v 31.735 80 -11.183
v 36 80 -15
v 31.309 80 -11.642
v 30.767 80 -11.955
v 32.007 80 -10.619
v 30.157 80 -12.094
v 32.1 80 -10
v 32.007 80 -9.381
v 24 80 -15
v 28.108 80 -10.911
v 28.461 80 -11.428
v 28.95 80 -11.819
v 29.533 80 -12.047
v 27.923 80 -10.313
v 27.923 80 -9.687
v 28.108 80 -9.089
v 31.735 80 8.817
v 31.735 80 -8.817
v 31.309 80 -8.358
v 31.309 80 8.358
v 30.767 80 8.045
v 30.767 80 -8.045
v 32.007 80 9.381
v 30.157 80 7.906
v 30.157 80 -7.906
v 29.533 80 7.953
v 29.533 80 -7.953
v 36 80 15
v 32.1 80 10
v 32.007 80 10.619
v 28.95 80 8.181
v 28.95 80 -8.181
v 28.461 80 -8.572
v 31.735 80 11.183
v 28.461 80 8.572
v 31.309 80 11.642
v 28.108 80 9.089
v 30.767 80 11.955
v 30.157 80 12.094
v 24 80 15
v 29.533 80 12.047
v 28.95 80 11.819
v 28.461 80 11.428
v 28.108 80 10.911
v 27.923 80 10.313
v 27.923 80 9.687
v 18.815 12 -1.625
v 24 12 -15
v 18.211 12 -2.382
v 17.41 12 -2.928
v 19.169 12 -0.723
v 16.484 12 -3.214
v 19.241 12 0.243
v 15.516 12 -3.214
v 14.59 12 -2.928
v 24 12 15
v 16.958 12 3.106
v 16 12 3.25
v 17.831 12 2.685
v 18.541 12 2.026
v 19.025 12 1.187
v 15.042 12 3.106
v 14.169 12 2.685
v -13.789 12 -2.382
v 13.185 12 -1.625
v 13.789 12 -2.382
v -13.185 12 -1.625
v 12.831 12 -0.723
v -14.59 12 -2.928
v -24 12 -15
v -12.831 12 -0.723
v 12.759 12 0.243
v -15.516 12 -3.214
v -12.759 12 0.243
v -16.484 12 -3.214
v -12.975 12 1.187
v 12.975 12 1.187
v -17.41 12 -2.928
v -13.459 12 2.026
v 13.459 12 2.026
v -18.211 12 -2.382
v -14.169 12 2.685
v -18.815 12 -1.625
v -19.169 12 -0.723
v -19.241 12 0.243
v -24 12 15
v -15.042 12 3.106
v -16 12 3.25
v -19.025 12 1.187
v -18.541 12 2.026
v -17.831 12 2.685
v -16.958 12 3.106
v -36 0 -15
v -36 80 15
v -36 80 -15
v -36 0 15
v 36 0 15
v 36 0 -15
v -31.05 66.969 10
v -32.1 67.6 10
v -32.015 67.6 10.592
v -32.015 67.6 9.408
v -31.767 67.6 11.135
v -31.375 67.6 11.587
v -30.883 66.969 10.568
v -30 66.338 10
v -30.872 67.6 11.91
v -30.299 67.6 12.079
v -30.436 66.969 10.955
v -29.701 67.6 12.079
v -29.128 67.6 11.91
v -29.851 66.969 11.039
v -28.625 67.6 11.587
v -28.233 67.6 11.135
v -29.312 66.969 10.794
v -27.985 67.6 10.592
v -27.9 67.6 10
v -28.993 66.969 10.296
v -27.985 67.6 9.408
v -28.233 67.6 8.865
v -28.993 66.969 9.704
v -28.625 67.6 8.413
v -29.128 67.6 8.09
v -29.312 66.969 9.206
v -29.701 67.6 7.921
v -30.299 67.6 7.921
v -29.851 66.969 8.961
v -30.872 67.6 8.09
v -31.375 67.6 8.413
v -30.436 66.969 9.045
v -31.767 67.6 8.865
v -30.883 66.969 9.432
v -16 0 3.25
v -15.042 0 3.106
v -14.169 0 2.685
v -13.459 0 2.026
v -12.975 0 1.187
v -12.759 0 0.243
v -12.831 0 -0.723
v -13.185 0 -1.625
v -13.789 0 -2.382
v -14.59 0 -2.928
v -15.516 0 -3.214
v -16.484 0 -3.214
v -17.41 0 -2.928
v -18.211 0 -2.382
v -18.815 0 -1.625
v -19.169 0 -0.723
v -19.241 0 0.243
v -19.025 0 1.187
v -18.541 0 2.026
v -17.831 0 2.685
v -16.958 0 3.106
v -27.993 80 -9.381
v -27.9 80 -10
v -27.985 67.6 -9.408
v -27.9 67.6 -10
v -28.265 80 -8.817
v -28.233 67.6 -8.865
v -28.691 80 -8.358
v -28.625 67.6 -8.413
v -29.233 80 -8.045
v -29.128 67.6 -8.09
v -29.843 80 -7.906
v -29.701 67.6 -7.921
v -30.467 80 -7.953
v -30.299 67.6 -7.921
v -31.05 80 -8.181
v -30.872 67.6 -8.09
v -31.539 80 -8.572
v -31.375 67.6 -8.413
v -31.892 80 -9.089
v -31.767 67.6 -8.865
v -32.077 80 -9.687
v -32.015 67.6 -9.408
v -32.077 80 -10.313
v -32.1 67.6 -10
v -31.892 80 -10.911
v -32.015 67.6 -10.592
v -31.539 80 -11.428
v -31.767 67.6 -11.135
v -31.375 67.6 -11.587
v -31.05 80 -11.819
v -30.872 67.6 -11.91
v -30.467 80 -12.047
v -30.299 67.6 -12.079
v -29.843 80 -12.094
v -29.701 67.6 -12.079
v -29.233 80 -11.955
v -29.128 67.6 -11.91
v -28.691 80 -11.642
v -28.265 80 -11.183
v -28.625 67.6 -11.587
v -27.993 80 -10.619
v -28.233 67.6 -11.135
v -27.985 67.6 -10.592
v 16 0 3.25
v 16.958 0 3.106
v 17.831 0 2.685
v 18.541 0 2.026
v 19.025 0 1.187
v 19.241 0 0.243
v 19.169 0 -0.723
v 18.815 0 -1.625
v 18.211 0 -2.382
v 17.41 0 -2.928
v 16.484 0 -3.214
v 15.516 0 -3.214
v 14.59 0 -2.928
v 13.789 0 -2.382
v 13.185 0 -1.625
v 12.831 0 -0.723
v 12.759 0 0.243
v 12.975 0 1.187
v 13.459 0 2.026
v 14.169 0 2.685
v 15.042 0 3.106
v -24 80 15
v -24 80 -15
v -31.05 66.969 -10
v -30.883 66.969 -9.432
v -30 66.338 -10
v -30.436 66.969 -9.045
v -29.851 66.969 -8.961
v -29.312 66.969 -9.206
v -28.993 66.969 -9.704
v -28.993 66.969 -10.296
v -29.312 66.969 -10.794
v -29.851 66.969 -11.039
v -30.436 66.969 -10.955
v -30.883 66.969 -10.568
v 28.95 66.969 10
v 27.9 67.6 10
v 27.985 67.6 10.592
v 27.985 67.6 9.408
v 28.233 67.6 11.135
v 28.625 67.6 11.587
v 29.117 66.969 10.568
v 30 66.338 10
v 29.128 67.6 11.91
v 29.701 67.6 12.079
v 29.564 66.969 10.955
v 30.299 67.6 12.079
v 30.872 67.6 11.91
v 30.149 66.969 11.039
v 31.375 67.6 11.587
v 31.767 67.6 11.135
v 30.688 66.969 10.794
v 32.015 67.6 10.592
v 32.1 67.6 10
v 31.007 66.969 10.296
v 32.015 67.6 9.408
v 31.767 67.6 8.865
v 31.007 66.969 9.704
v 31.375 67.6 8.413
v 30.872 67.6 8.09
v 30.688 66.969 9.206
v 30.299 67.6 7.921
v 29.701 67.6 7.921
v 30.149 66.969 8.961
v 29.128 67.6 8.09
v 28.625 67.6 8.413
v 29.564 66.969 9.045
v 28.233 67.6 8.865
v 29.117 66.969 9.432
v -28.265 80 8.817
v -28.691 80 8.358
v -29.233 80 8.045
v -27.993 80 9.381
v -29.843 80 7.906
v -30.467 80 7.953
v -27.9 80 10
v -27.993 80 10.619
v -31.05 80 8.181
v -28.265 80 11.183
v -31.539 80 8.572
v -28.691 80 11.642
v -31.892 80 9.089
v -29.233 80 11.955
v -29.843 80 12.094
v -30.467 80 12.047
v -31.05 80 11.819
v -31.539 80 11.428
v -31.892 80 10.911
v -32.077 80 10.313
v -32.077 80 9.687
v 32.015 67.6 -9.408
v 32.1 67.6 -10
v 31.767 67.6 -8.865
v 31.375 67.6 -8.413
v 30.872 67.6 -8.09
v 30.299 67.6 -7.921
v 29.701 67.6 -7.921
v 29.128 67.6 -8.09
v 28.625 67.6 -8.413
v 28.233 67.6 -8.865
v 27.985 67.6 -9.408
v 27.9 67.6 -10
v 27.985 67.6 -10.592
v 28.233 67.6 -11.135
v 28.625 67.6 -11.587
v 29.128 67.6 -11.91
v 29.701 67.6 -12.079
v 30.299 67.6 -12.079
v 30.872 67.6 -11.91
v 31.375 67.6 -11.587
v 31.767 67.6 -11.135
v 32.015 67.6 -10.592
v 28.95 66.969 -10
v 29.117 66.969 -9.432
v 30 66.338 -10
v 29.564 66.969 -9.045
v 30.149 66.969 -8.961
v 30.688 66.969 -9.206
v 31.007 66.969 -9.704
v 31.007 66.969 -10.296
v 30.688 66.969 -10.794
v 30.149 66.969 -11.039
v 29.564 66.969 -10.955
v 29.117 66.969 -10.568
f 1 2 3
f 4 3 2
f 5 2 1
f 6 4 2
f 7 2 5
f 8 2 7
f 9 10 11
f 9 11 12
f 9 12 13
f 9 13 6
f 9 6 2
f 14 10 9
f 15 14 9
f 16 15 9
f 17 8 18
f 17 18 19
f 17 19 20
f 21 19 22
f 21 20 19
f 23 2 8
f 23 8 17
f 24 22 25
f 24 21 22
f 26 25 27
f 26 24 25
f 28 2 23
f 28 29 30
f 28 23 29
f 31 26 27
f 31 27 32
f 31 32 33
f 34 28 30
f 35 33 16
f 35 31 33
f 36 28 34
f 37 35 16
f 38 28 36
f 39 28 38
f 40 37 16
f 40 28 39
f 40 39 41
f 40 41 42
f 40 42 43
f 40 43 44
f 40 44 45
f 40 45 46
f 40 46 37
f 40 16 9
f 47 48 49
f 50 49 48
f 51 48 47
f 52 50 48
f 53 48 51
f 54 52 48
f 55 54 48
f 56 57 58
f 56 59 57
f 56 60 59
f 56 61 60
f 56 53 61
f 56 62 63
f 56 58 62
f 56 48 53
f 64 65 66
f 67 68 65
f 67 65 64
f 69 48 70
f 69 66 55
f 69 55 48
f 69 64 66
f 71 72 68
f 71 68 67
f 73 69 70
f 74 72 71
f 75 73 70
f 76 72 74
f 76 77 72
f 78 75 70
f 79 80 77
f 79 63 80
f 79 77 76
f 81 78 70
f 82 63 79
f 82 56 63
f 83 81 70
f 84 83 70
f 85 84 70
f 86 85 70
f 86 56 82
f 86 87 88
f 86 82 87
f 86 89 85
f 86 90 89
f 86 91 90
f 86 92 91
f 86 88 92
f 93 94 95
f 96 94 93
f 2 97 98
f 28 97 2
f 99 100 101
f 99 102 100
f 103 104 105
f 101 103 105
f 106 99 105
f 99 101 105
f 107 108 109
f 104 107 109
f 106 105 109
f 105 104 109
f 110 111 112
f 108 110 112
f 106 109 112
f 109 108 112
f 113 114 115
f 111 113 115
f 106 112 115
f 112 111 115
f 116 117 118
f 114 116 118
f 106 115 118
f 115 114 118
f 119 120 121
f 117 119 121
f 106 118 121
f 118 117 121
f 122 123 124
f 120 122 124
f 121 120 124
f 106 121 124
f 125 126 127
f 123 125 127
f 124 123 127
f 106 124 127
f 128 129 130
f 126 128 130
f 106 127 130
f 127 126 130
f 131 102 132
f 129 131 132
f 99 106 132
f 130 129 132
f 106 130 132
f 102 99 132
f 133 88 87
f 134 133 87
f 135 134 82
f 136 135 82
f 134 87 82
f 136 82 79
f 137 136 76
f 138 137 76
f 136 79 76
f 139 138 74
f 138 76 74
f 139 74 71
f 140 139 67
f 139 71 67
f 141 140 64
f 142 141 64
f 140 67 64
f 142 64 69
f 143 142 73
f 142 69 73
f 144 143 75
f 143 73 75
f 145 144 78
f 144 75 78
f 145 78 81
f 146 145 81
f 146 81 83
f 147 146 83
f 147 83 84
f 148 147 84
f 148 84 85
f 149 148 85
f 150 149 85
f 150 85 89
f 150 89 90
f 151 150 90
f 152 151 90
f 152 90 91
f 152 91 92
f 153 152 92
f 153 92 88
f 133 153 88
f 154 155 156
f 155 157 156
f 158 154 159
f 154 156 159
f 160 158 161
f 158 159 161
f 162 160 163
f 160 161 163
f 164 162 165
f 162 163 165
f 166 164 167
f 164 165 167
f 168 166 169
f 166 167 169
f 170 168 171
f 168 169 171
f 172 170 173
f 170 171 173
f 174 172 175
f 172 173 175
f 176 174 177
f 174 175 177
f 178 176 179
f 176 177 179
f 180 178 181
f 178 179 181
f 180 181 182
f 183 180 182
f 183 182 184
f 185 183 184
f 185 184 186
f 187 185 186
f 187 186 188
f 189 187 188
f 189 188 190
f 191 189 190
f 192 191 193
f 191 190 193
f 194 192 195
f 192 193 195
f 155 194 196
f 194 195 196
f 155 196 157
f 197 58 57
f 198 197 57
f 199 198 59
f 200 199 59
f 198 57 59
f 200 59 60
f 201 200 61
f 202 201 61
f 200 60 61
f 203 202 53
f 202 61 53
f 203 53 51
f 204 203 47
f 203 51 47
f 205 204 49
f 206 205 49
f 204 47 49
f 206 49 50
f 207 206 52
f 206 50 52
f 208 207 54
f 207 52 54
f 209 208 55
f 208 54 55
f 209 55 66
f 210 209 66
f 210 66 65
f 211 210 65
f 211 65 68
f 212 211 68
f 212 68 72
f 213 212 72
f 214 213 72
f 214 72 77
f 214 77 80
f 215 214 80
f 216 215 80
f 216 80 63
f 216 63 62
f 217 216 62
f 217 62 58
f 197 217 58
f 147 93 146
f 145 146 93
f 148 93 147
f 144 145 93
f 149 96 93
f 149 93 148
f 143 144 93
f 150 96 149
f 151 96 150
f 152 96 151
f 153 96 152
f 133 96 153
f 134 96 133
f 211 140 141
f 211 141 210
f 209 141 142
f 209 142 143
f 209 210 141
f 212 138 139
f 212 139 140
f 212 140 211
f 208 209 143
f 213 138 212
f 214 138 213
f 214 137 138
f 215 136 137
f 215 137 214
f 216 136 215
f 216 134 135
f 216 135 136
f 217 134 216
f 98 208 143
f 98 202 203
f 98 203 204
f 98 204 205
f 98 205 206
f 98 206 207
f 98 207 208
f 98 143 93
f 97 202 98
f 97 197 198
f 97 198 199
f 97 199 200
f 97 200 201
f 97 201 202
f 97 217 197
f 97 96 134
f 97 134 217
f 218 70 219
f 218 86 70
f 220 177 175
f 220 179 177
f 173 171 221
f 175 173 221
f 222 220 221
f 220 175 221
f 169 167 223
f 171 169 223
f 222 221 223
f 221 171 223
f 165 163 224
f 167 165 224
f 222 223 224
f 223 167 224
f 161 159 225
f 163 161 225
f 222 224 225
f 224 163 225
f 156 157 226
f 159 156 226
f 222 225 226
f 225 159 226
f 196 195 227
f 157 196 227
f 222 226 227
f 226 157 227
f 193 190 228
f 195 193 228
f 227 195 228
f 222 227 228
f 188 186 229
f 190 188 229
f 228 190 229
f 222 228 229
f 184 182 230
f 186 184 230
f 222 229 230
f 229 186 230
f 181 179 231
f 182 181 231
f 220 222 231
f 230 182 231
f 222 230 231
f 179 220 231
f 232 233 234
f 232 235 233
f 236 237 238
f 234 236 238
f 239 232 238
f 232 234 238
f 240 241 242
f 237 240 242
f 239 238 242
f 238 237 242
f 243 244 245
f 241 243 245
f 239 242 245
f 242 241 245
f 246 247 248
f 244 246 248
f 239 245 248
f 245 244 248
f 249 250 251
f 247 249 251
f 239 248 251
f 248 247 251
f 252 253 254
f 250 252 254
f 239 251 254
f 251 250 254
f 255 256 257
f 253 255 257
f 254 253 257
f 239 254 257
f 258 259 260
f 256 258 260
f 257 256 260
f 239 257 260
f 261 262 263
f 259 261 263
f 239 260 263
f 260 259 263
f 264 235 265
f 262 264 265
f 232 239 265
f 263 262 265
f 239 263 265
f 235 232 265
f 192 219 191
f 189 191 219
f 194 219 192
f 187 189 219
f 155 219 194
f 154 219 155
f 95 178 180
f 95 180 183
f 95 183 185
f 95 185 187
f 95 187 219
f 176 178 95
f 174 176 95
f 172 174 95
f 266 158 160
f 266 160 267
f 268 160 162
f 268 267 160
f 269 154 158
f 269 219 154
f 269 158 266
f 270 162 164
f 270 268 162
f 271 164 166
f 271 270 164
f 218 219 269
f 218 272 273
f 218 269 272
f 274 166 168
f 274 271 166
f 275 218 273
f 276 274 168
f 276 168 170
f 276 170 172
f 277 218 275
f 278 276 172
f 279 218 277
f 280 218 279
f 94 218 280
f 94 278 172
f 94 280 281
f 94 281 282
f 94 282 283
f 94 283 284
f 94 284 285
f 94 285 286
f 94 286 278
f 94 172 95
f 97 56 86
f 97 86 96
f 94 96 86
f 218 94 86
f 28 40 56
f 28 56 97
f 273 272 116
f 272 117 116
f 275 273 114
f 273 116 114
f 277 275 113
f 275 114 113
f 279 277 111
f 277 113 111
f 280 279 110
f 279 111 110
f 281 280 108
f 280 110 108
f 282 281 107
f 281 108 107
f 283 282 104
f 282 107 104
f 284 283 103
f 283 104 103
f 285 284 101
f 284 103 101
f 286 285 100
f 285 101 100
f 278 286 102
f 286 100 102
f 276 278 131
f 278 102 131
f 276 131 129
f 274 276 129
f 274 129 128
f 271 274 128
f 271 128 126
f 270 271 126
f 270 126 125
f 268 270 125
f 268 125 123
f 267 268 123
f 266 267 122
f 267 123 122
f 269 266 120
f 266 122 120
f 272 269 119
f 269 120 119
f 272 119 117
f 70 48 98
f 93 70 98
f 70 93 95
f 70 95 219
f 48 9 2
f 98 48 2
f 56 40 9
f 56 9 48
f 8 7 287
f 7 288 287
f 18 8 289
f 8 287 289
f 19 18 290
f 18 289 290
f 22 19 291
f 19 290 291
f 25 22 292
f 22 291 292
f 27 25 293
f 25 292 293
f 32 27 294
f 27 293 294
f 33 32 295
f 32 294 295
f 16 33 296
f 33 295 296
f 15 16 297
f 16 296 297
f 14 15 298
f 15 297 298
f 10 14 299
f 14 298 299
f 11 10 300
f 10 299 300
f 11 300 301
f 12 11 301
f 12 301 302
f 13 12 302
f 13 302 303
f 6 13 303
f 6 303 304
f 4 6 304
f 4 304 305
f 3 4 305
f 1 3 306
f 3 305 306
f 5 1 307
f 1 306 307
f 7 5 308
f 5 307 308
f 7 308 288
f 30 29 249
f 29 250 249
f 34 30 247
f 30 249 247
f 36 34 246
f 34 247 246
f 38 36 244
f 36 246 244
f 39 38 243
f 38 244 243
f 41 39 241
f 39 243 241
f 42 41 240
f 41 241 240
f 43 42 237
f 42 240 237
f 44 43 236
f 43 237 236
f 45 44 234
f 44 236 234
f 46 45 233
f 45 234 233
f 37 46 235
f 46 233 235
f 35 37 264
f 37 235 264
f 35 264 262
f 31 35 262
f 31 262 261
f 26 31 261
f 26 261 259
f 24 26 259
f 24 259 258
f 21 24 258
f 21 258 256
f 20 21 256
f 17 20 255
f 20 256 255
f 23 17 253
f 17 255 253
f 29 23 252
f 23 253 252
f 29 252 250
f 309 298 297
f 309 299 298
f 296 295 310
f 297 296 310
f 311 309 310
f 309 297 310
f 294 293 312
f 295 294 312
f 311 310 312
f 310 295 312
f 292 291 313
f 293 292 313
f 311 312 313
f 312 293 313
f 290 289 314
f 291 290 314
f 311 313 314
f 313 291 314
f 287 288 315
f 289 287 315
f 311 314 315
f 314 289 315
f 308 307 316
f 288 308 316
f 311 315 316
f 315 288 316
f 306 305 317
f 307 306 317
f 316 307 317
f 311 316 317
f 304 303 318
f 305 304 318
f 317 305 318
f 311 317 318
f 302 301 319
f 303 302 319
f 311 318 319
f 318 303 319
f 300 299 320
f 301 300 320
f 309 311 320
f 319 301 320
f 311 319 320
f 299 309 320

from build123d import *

# Parameters (mm, degrees)
EXTRUDE_1_DEPTH     = 15
M5X0_8_1_D          = 4.2
M5X0_8_1_DEPTH      = 12.4
M5X0_8_1_TIP        = 1.2618073
SKETCH_4_R          = 3.25
CUT_EXTRUDE_1_DEPTH = 79.390050389


with BuildPart() as part:
    # 草图1 → 凸台-拉伸1 (new, symmetric)
    with BuildSketch(Plane.XY):
        Polygon((-36, 80), (-36, 0), (36, 0), (36, 80), (24, 80), (24, 12), (-24, 12), (-24, 80), align=None)
    extrude(amount=EXTRUDE_1_DEPTH, both=True)

    # M5x0.8 螺纹孔1
    with Locations(Plane(origin=(0, 80, 0), x_dir=(-1, 0, 0), z_dir=(0, 1, 0))):
        with Locations((-30, -10), (30, -10), (30, 10), (-30, 10)):
            Hole(M5X0_8_1_D / 2, depth=M5X0_8_1_DEPTH)
            with Locations((0, 0, -(M5X0_8_1_DEPTH + M5X0_8_1_TIP / 2))):  # 118° drill point
                Cone(0, M5X0_8_1_D / 2, M5X0_8_1_TIP, mode=Mode.SUBTRACT)

    # 草图4 → 切除-拉伸1 (cut, through all)
    with BuildSketch(Plane(origin=(0, 12, 0), x_dir=(1, 0, 0), z_dir=(0, 1, 0))):
        with Locations(Location((-16, 0, 0), (0, 0, 270))):
            Circle(SKETCH_4_R)
        with Locations(Location((16, 0, 0), (0, 0, 270))):
            Circle(SKETCH_4_R)
    extrude(amount=-CUT_EXTRUDE_1_DEPTH, mode=Mode.SUBTRACT)


solid = part.part
